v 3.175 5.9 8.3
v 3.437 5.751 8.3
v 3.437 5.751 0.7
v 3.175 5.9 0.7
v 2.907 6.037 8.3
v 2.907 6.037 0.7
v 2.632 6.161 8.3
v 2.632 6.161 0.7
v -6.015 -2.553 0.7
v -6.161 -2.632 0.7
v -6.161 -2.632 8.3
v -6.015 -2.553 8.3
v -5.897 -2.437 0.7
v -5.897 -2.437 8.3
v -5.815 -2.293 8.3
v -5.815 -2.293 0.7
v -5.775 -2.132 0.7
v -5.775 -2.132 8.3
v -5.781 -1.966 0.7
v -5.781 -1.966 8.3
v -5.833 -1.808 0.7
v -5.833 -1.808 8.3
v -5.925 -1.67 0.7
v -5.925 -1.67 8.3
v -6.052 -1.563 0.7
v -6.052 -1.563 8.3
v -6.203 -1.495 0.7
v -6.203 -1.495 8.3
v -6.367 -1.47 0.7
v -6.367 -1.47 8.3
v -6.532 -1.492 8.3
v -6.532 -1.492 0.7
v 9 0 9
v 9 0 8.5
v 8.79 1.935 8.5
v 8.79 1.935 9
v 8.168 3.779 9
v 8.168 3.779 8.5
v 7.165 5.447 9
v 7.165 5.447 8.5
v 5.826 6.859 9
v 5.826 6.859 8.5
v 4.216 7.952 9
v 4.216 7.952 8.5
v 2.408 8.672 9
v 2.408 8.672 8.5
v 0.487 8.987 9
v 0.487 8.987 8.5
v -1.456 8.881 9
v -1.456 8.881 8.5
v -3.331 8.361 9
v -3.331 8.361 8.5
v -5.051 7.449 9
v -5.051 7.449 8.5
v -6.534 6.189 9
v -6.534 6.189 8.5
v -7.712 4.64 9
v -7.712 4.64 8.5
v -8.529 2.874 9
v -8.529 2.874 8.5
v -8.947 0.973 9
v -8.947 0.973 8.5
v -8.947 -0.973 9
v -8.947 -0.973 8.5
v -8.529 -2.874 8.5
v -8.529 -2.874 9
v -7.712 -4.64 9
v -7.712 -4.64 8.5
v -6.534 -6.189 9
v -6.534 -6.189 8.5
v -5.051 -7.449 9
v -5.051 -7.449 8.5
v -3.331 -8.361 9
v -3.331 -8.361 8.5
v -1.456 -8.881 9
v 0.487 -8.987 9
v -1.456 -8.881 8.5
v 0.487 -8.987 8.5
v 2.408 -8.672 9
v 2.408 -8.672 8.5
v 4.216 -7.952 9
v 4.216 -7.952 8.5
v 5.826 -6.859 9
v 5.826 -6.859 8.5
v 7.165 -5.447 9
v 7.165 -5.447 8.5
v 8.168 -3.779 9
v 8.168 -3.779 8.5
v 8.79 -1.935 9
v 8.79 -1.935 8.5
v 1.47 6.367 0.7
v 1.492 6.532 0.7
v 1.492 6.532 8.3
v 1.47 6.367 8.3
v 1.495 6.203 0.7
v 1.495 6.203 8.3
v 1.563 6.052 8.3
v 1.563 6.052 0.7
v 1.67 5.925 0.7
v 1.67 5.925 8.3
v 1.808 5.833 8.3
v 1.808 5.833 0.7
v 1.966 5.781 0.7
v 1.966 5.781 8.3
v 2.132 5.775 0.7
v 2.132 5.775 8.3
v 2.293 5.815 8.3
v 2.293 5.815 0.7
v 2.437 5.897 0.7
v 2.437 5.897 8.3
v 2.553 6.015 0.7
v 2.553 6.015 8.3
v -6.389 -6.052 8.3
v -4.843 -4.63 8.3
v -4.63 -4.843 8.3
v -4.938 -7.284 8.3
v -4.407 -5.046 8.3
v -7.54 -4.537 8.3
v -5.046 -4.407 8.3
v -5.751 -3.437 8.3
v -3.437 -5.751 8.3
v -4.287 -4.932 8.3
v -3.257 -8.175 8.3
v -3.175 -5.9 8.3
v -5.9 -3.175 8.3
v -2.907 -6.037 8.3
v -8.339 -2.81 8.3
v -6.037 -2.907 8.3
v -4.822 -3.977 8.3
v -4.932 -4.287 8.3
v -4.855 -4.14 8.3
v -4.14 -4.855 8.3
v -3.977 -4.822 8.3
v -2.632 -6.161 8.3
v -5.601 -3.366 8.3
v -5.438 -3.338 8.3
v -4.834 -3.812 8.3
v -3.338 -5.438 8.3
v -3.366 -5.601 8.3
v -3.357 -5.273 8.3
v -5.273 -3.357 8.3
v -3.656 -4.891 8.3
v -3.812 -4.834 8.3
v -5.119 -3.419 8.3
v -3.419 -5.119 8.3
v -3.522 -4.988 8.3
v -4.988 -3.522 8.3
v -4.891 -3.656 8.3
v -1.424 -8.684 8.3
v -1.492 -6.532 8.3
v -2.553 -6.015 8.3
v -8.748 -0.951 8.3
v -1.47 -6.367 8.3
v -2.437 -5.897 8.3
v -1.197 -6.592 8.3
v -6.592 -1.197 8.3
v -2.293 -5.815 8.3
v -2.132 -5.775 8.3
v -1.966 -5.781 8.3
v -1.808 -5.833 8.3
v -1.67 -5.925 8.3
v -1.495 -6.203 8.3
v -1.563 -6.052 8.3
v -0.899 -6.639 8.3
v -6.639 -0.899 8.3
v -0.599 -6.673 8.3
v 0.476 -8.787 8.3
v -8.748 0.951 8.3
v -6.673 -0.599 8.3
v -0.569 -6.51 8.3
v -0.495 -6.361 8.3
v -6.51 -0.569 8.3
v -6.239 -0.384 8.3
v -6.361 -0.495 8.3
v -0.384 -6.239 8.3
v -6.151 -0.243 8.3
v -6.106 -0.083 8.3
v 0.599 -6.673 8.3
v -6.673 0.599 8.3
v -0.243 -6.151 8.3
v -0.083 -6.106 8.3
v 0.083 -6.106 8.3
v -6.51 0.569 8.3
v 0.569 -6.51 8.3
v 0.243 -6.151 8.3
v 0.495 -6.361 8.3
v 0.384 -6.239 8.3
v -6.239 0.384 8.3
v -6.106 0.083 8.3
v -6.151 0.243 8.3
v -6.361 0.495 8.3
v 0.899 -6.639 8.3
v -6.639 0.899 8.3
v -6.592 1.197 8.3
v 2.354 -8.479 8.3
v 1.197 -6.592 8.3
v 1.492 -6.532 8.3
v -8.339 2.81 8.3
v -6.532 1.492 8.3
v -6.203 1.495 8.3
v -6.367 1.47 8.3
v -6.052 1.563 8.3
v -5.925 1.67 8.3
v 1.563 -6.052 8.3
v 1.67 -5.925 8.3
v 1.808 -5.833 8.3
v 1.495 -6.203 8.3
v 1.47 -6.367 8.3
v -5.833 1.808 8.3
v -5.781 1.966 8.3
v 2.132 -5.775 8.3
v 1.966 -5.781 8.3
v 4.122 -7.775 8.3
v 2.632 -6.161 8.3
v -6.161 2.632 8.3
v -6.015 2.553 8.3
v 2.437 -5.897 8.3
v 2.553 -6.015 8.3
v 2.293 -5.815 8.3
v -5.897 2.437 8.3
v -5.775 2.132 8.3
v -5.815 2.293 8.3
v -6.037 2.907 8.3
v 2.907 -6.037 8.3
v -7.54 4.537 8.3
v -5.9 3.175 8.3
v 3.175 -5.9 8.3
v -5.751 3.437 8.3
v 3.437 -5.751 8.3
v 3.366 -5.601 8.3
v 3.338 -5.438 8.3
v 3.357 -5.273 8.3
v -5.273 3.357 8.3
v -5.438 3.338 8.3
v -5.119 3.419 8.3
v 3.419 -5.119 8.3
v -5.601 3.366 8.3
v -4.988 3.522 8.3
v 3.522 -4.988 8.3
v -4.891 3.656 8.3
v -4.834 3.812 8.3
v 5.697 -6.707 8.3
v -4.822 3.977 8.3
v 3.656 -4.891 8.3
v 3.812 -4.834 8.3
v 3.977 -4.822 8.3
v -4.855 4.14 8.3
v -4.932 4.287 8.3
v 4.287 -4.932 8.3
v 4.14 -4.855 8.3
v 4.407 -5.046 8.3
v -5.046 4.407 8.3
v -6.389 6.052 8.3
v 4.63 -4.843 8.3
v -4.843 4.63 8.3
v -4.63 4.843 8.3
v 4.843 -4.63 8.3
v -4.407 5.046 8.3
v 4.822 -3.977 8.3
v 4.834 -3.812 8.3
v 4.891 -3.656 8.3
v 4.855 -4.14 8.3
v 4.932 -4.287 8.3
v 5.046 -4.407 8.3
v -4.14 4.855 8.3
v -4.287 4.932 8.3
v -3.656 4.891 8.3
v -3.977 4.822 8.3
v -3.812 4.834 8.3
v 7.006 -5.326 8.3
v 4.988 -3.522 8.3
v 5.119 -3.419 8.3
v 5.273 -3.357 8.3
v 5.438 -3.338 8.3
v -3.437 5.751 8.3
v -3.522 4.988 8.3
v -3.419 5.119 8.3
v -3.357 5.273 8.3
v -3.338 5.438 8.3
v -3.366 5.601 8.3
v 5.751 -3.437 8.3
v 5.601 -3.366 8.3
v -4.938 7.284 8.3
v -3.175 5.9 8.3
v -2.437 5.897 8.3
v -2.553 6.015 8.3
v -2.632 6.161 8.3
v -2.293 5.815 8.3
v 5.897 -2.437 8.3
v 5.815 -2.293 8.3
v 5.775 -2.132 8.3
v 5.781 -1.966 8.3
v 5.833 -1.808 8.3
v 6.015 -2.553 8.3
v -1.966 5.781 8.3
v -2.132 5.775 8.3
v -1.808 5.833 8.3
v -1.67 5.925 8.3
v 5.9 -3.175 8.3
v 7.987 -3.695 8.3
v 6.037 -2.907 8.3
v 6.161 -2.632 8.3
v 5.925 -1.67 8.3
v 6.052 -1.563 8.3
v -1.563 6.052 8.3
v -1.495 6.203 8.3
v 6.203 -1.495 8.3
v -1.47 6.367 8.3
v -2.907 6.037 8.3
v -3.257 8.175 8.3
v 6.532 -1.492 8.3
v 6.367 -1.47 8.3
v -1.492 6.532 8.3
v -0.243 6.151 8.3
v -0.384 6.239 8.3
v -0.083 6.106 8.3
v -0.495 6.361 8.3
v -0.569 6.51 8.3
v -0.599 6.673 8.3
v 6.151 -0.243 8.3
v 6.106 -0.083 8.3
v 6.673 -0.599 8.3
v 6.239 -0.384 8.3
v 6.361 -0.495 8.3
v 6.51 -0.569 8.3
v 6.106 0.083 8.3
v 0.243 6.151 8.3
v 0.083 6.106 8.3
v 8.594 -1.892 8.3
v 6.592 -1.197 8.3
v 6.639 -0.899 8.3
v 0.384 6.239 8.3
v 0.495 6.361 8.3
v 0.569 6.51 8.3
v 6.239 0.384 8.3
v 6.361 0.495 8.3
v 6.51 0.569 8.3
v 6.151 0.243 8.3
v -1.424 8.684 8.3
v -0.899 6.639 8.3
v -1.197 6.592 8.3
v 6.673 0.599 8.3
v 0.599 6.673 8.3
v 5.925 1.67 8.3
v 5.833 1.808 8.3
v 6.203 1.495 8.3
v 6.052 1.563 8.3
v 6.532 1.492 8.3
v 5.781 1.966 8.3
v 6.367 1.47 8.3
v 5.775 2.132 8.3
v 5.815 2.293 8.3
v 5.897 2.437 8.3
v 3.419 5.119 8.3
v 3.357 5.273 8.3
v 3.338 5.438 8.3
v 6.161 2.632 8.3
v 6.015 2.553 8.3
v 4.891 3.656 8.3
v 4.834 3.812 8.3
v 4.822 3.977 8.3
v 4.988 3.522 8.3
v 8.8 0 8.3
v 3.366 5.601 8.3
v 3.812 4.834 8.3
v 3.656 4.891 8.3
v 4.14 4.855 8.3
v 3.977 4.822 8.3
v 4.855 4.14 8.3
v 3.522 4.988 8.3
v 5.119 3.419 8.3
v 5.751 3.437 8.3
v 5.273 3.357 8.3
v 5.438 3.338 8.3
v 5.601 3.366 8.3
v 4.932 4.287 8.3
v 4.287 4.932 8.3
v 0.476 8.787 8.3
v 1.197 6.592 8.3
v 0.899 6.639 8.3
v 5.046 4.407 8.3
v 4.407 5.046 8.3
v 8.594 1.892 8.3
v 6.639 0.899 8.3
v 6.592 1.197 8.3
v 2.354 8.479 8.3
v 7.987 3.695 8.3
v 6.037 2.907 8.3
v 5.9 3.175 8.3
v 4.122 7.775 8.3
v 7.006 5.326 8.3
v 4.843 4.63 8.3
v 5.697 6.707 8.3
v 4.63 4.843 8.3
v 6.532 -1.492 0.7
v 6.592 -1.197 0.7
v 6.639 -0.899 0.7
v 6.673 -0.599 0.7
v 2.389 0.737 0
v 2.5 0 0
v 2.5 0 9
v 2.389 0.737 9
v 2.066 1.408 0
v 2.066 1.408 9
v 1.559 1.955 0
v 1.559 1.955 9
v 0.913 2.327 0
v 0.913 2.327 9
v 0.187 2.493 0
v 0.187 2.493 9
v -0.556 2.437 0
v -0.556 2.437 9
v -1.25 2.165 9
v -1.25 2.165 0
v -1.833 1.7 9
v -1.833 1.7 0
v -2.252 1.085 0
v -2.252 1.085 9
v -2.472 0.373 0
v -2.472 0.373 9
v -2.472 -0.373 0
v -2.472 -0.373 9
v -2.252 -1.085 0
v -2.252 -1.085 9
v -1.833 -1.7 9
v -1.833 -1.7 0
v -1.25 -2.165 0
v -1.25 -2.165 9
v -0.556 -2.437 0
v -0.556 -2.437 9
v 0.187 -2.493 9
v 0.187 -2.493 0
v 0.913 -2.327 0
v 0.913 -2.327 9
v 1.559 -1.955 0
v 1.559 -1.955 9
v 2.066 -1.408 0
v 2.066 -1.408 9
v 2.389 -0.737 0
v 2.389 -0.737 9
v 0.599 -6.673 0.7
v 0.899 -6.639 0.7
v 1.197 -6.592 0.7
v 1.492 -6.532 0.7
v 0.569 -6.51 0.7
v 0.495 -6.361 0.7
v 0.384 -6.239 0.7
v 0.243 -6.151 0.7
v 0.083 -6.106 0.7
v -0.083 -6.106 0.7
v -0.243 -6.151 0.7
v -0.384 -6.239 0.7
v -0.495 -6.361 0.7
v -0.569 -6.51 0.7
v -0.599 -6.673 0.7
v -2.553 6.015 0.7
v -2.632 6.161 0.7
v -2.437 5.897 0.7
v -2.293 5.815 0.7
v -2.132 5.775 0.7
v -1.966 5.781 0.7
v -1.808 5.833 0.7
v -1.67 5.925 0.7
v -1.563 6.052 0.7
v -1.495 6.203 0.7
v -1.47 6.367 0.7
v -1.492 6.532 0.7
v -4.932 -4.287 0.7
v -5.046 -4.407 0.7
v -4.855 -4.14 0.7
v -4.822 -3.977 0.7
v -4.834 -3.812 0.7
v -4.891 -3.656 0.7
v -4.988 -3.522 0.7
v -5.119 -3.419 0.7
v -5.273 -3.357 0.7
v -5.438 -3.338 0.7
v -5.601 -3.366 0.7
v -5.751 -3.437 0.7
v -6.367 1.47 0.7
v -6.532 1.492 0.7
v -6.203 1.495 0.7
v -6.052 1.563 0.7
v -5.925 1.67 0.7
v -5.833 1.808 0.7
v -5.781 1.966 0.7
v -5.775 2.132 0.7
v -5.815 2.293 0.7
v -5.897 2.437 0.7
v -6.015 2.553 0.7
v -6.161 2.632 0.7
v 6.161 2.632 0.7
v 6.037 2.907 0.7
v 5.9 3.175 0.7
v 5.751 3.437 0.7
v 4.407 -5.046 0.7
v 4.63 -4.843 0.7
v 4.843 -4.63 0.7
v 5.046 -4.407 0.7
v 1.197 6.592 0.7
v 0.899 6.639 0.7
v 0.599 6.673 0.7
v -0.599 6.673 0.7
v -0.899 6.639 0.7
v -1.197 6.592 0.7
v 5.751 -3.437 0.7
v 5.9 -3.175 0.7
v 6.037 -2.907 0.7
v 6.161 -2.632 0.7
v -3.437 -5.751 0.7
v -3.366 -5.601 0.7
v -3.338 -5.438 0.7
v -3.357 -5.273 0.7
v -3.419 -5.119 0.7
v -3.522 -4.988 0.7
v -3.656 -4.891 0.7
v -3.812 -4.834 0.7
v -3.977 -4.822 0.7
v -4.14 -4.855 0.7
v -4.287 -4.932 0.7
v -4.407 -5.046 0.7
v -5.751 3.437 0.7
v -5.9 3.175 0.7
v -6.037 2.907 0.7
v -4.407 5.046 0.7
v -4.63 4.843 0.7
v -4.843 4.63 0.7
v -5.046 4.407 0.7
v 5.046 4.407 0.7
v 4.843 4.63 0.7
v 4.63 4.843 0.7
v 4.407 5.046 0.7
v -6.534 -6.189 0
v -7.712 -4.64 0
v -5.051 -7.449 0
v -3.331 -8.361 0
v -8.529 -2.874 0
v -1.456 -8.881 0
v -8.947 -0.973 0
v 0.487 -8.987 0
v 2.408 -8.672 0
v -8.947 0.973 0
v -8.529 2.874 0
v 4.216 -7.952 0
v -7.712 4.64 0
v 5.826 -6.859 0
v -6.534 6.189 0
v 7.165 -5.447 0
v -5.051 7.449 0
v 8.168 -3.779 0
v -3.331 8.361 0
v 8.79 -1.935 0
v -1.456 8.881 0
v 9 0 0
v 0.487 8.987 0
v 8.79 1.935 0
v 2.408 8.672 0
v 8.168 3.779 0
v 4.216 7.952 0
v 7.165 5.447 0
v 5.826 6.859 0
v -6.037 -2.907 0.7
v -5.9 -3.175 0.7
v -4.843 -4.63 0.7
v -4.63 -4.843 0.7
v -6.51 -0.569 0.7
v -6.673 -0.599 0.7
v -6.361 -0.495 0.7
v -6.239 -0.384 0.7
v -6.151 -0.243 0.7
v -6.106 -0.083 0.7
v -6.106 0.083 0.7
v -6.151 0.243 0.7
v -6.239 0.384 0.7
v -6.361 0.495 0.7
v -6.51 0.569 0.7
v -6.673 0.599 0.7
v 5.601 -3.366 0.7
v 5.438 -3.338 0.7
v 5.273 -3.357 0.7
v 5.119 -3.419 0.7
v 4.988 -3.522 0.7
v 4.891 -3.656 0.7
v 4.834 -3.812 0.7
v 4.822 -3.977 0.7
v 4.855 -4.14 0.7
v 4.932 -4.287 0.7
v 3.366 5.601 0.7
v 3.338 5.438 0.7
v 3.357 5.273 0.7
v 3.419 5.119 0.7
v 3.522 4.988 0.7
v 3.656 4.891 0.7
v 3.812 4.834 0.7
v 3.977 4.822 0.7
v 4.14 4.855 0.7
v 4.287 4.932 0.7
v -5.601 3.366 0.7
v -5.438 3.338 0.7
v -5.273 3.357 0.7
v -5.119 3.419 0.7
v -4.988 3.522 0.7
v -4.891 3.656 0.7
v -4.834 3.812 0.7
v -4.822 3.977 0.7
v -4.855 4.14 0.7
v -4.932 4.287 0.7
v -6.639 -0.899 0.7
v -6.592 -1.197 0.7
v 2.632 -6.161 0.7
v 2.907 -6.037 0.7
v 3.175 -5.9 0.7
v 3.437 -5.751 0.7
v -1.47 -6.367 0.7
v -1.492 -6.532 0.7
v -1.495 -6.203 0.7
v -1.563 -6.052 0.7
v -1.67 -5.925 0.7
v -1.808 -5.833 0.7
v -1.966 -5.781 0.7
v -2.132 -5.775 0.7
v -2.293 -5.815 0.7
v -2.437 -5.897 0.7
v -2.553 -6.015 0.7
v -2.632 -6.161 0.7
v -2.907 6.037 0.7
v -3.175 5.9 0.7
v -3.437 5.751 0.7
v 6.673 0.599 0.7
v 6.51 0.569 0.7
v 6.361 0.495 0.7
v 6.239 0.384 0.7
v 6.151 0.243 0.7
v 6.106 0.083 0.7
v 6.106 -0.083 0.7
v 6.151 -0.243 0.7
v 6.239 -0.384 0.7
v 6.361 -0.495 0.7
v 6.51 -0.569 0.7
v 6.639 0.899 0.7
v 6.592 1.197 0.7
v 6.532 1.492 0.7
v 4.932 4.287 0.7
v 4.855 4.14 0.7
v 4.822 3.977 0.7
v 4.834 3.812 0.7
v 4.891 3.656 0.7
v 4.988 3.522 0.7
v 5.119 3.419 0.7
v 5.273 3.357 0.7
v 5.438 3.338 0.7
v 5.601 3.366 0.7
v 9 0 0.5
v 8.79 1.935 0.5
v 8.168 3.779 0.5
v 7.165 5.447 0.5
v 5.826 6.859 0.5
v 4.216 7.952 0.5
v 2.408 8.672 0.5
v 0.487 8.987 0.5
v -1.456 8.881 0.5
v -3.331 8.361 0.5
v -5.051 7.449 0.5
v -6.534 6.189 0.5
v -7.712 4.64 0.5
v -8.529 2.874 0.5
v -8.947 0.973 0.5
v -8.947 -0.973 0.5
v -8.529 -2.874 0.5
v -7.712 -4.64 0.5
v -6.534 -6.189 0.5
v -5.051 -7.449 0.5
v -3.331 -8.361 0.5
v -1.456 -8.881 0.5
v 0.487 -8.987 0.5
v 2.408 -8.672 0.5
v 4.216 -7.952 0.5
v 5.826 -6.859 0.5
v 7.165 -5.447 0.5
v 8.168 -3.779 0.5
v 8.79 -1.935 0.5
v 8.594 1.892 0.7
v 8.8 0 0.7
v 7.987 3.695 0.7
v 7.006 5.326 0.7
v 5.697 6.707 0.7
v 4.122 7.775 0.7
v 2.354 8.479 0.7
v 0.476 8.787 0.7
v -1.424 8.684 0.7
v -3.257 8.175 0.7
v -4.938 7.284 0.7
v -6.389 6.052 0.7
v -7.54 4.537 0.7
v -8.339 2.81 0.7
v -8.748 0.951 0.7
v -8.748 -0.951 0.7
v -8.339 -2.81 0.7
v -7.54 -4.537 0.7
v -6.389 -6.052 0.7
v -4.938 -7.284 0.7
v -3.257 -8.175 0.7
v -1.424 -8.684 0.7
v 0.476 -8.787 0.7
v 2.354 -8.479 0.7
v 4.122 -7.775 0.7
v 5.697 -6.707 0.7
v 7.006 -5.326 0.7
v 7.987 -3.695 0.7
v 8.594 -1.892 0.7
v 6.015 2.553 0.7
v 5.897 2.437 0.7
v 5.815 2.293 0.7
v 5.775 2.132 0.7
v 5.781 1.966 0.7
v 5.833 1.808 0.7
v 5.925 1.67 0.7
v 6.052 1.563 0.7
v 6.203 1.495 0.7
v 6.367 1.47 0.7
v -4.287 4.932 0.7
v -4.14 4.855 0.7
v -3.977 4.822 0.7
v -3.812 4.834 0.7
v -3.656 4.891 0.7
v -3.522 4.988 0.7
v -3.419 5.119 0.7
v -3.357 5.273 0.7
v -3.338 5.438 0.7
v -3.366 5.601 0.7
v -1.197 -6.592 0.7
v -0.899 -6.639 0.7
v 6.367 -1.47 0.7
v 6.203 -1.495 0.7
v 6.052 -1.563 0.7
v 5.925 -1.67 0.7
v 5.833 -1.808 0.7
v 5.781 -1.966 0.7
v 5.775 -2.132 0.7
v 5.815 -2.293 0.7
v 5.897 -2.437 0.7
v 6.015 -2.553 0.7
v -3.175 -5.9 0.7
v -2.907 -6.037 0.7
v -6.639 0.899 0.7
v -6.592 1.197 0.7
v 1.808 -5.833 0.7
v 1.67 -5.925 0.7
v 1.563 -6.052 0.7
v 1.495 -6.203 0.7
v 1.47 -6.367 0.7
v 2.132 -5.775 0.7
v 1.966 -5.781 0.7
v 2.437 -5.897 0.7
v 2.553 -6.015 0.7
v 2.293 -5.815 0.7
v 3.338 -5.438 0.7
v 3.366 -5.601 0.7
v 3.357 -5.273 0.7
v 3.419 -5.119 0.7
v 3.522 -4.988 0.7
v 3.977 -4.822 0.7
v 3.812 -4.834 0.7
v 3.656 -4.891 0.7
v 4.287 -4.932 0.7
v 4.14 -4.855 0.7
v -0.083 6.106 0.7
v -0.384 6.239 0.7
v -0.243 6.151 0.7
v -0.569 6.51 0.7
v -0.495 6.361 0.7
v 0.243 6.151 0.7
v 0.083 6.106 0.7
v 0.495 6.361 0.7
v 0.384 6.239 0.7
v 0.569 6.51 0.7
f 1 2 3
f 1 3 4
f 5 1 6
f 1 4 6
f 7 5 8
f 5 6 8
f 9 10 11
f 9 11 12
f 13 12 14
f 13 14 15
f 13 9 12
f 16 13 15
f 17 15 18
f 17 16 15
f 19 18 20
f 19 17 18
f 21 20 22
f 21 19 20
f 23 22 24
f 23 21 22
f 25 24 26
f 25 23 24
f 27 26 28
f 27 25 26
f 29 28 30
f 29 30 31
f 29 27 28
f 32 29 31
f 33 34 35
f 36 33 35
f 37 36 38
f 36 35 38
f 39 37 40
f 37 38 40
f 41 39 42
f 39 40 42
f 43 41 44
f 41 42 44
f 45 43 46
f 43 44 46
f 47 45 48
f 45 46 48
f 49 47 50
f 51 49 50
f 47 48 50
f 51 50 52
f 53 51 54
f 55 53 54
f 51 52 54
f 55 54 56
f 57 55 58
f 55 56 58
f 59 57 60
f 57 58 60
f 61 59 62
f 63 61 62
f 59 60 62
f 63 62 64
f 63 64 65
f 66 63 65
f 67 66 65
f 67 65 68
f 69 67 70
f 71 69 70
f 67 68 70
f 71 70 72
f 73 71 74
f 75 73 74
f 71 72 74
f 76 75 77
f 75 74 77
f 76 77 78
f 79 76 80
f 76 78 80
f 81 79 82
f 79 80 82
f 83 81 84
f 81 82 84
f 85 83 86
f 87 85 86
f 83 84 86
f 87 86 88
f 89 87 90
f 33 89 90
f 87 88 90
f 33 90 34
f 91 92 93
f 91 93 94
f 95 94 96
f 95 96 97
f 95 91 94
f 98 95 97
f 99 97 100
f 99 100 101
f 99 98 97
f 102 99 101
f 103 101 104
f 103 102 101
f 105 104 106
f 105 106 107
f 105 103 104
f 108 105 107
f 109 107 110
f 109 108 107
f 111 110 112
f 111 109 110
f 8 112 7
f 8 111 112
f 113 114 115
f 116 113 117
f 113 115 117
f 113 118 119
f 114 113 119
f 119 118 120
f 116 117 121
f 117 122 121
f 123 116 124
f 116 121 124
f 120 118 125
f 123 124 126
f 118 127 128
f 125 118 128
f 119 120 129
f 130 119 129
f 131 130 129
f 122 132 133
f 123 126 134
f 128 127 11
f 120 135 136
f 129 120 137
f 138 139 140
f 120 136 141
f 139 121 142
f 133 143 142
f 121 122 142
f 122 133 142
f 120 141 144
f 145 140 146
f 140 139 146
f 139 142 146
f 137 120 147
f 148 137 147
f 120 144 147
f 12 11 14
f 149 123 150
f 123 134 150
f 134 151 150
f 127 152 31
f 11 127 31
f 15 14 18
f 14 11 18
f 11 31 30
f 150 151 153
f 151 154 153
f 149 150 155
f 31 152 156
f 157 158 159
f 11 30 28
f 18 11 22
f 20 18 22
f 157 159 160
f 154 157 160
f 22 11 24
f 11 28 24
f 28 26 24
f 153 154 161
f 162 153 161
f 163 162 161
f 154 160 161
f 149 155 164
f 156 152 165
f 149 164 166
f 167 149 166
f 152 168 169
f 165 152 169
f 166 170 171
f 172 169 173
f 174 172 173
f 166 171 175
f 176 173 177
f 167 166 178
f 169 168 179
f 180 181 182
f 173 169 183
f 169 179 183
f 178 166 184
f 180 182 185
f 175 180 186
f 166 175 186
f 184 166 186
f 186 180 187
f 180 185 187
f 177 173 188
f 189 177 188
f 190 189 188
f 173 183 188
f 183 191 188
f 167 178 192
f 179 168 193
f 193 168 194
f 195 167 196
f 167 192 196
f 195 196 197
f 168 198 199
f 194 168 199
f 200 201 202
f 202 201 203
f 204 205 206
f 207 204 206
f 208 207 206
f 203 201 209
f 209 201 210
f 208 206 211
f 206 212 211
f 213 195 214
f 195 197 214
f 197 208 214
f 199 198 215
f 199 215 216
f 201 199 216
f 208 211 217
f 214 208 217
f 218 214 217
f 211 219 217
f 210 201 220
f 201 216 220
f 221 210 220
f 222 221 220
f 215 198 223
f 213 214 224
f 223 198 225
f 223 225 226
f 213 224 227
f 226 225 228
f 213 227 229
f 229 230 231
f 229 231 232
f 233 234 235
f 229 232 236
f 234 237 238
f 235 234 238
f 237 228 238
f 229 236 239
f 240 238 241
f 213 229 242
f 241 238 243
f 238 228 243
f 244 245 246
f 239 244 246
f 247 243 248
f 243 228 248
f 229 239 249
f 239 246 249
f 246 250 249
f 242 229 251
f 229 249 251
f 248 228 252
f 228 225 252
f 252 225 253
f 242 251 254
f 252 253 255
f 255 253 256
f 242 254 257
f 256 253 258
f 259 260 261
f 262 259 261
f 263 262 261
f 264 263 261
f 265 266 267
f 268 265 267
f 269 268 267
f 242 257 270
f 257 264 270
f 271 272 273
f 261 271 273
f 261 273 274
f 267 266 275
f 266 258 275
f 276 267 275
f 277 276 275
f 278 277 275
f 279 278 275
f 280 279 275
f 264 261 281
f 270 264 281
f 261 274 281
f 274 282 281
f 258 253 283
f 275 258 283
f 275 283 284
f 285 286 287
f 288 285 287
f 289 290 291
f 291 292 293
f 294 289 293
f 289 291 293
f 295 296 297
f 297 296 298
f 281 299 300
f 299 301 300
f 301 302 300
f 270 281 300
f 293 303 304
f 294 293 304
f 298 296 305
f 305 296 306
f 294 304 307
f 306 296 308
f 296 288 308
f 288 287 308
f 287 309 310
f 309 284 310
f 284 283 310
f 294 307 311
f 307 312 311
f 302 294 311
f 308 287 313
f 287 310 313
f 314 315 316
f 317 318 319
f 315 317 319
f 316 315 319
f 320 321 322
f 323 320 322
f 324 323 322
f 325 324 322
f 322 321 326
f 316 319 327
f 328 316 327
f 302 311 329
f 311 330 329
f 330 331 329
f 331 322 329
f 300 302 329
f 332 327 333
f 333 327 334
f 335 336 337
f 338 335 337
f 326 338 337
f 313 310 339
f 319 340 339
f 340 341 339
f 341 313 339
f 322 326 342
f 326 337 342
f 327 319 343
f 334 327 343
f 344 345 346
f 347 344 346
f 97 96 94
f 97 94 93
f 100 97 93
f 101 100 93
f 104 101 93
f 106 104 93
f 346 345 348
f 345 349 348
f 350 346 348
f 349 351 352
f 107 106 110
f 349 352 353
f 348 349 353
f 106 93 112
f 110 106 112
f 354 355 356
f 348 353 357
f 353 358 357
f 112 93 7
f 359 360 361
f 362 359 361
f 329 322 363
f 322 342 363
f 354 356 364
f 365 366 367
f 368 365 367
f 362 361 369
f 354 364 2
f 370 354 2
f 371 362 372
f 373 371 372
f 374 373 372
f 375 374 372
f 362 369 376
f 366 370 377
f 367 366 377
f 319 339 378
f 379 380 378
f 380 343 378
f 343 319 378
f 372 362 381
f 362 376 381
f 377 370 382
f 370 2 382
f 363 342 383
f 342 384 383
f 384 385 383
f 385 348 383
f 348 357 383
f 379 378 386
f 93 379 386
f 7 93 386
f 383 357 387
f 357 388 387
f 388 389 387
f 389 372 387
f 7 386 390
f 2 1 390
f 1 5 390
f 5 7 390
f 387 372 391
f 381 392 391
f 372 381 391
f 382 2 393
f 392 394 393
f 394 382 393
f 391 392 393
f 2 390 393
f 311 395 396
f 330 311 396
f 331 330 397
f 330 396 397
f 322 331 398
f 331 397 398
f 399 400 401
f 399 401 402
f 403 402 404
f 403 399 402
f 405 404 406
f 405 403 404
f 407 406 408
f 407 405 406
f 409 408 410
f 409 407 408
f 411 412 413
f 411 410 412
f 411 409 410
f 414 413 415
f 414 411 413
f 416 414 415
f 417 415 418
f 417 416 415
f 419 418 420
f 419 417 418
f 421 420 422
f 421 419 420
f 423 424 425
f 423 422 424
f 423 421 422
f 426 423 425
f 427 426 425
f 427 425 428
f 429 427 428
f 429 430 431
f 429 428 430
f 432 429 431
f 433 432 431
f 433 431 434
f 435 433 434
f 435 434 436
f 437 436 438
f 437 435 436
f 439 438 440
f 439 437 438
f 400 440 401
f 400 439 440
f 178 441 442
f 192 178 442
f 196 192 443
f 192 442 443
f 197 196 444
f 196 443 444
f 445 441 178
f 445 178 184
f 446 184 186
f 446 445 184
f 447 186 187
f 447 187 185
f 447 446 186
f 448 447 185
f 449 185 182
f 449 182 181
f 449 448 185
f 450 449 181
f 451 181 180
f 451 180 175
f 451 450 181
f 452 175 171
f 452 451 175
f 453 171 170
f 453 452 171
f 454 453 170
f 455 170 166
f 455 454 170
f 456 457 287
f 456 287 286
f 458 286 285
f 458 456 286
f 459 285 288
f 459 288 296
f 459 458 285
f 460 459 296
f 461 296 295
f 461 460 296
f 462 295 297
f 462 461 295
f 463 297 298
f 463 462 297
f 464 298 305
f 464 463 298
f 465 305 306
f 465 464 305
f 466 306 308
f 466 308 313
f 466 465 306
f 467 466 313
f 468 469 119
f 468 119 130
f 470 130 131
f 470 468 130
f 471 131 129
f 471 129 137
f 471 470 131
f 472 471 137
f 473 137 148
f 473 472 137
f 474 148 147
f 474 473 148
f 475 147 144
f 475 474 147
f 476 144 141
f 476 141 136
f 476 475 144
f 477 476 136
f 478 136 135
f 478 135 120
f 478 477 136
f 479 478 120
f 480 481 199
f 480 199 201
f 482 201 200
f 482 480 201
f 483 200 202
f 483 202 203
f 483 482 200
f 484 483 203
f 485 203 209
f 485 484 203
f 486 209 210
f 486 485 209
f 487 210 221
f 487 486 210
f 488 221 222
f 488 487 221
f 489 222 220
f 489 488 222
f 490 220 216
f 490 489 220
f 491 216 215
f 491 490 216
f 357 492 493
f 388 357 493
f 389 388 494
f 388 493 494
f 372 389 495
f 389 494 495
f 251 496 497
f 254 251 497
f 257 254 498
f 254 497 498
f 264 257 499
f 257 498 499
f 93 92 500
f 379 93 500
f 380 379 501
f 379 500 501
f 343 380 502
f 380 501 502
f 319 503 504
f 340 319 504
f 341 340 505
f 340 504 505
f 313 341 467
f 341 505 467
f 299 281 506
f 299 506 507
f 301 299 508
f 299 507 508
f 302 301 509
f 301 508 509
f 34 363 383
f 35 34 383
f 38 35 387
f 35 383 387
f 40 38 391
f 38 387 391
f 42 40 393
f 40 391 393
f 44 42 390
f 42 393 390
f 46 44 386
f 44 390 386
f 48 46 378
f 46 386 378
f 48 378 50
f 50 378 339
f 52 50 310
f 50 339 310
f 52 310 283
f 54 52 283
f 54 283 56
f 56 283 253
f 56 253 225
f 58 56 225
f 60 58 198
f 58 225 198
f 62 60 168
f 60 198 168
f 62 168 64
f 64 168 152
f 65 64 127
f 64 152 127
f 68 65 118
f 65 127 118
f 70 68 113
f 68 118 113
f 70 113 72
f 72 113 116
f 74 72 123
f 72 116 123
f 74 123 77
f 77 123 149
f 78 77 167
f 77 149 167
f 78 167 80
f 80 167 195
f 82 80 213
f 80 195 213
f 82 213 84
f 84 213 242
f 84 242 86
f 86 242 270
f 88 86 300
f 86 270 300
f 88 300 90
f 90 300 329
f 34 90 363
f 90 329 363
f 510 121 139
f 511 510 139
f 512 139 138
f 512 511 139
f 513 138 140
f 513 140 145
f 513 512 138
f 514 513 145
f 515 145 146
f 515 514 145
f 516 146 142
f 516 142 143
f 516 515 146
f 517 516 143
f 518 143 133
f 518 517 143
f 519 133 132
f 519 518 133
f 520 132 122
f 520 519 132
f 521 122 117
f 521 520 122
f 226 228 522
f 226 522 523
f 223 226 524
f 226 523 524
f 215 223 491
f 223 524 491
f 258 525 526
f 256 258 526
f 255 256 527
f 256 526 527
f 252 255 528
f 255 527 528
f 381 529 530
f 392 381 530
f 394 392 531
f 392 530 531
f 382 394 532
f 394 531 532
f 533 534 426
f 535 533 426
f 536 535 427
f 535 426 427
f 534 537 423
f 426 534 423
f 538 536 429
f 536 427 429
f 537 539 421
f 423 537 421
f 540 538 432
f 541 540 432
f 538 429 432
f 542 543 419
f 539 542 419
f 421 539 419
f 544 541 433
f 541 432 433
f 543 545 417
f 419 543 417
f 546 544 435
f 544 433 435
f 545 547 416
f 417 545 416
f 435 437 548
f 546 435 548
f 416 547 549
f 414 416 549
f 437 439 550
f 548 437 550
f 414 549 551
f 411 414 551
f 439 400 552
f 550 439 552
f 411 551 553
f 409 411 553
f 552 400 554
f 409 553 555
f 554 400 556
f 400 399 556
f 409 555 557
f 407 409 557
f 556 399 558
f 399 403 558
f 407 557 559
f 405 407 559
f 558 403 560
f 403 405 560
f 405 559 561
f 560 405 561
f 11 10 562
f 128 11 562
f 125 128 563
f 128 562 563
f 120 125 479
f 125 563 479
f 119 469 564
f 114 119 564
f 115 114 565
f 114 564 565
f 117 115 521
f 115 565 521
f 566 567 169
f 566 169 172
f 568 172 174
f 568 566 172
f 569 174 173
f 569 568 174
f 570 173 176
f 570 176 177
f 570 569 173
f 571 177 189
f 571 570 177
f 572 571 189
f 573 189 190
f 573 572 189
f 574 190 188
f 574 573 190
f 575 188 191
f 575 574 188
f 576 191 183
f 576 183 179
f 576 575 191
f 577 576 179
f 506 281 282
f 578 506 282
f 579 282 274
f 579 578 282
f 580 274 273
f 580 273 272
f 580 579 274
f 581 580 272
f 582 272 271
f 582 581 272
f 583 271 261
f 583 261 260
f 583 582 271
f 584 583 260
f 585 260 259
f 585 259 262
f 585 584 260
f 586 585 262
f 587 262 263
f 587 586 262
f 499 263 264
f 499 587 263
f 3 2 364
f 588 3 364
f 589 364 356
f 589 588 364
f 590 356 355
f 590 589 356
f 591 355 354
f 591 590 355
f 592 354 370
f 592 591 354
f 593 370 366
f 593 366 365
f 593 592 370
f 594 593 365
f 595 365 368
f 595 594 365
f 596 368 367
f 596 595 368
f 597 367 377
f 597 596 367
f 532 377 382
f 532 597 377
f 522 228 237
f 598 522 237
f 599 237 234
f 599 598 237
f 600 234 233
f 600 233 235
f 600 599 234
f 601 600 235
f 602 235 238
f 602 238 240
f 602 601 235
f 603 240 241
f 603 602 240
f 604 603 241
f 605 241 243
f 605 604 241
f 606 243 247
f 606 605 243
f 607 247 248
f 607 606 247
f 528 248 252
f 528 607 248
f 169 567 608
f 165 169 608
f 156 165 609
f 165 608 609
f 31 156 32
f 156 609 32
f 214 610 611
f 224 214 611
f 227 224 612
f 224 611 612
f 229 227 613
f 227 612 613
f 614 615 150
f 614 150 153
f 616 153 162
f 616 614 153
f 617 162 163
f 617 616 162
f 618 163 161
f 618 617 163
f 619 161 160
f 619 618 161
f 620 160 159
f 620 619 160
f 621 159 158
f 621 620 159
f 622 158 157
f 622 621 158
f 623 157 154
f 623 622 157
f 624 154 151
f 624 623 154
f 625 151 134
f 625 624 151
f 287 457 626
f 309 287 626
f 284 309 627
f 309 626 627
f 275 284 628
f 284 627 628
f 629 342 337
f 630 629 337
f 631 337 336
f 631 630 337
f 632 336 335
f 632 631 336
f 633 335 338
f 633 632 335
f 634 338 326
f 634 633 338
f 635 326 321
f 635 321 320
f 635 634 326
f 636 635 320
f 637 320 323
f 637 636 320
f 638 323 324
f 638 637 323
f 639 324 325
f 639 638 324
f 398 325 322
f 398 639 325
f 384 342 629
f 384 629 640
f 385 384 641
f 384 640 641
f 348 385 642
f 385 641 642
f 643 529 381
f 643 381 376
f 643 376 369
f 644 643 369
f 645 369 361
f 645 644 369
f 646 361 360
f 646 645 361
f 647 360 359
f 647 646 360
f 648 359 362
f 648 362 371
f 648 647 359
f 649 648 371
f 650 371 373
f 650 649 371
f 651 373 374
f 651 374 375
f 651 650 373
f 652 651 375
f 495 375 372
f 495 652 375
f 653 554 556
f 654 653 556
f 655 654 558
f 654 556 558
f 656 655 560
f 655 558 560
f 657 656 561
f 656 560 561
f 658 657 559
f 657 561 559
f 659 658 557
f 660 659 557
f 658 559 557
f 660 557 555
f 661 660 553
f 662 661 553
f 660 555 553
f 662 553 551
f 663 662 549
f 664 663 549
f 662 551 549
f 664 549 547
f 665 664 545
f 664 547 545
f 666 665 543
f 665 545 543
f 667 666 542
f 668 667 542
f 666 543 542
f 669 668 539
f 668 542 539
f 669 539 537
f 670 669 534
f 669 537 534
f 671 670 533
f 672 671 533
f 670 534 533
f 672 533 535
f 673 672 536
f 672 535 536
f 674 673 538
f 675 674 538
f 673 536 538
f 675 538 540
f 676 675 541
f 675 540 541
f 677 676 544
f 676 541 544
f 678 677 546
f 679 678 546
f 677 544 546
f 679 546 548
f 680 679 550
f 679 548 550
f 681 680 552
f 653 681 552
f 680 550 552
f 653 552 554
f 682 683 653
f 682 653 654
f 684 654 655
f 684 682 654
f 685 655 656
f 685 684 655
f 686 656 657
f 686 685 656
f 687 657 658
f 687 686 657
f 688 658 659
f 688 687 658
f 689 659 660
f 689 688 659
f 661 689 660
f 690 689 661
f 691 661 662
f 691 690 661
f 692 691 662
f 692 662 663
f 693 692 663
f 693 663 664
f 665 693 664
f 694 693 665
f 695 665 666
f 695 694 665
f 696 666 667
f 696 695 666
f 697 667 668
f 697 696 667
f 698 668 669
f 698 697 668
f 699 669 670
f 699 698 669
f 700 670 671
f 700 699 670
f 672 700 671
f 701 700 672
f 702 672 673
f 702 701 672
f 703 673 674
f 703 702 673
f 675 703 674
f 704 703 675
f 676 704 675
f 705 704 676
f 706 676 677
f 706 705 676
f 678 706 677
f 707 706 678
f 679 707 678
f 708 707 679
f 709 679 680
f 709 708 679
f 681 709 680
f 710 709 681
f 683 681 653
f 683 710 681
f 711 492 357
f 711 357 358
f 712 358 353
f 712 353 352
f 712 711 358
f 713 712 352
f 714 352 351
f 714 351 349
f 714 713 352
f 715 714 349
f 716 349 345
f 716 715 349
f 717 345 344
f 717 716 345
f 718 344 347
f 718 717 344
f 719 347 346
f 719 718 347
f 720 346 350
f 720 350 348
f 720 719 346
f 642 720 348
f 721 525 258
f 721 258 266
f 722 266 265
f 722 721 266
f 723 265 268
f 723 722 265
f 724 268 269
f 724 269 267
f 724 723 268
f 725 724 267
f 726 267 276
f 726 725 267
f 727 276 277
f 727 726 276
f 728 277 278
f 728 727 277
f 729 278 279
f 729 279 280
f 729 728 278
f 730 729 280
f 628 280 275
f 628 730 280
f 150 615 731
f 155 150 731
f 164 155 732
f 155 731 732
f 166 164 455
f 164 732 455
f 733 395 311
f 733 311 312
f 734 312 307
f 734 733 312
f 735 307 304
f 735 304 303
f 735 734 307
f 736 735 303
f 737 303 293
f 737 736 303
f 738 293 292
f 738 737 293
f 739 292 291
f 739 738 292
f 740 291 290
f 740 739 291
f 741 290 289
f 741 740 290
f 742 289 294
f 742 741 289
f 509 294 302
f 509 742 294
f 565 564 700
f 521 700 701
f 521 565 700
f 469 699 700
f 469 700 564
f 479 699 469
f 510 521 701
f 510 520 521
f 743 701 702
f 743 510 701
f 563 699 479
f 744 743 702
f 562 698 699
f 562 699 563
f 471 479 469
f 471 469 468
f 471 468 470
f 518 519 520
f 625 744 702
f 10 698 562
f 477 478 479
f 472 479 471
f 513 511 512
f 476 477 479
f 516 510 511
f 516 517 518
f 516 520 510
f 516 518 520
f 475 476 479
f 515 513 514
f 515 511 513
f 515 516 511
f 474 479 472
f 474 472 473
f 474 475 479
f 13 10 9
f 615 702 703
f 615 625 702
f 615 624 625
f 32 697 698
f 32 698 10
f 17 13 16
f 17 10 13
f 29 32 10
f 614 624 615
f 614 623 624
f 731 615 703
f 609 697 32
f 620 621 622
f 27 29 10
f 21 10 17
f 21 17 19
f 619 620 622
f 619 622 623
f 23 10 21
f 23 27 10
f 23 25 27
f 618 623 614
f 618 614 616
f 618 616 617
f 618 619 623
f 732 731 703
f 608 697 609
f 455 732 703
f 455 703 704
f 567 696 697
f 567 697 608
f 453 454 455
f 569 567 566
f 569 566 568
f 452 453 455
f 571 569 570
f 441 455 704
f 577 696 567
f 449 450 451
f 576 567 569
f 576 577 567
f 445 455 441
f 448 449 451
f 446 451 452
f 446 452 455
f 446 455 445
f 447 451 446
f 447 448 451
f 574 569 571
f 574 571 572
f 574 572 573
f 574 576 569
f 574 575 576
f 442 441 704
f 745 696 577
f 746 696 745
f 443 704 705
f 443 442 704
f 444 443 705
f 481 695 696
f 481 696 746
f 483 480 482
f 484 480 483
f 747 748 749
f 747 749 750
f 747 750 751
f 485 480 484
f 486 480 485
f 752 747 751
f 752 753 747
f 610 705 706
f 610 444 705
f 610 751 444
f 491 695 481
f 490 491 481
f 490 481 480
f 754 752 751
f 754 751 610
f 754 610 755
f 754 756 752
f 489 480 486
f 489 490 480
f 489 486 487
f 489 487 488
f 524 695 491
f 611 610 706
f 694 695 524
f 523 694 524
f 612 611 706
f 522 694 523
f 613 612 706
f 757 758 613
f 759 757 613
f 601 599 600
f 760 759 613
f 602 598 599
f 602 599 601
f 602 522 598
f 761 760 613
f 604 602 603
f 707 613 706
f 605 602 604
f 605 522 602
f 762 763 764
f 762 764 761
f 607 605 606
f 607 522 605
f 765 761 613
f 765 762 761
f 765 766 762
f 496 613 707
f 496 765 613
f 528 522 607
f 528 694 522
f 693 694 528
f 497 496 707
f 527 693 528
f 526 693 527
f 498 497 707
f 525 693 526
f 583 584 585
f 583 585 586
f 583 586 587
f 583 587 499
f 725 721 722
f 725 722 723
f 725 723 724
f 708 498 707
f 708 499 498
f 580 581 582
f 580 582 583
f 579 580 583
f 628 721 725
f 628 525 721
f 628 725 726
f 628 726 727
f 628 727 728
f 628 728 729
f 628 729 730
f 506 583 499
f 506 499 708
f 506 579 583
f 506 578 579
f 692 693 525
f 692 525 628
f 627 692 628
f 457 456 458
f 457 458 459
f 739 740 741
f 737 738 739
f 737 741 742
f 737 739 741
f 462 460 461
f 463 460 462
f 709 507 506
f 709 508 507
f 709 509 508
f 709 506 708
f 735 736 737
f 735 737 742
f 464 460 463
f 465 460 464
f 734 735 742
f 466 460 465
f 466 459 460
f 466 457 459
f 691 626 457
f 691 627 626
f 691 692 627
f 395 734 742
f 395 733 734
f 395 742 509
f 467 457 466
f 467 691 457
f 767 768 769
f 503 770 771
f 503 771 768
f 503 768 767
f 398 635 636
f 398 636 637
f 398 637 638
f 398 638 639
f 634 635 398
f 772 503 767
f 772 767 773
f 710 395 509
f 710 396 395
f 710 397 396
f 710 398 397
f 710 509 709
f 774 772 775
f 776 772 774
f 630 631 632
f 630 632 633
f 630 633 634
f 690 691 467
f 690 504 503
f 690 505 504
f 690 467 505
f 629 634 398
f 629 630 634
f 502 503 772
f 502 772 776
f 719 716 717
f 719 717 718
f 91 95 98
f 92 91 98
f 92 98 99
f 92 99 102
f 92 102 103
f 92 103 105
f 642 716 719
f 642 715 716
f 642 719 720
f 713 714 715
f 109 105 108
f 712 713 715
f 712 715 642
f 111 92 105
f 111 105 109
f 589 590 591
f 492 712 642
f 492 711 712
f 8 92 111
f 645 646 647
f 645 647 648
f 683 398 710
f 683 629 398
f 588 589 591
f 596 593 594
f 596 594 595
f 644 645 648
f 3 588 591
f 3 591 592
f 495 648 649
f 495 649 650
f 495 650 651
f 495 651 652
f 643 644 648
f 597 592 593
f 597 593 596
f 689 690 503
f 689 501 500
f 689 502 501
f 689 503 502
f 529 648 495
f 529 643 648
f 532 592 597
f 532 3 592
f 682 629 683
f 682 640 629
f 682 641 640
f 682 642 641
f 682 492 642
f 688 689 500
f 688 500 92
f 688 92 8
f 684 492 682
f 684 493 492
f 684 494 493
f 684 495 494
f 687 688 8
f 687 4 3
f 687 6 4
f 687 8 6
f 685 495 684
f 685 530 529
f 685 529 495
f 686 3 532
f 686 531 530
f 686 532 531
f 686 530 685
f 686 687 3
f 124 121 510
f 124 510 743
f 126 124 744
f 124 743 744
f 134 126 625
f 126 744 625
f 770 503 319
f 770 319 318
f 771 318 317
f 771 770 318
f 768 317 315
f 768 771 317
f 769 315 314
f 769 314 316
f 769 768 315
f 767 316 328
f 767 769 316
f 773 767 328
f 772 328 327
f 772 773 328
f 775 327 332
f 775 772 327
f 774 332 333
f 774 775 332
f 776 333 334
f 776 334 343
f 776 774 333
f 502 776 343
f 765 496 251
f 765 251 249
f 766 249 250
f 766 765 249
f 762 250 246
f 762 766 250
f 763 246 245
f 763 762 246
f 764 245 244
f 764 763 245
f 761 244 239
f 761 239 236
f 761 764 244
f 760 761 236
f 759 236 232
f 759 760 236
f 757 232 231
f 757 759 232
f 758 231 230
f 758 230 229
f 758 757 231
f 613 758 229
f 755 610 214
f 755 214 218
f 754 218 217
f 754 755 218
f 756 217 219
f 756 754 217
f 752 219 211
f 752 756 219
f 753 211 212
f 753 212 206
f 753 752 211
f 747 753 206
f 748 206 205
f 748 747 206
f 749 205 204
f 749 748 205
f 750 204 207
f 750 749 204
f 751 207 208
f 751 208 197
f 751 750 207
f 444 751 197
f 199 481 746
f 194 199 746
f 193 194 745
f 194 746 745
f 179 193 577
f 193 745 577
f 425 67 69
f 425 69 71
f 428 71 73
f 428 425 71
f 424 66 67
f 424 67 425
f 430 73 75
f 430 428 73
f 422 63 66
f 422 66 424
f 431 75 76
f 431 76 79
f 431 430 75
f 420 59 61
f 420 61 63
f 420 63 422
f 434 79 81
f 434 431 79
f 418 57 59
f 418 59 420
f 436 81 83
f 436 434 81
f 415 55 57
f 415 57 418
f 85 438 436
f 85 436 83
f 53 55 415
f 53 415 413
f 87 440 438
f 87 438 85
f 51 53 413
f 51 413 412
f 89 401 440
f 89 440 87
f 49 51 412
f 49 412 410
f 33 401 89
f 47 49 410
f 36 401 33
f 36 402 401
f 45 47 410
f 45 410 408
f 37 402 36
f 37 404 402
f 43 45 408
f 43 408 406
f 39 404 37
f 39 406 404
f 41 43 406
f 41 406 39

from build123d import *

# Parameters (mm, degrees)
CYLINDER017_R     = 2.5
CYLINDER017_DEPTH = 28.6
CYLINDER015_R     = 9
CYLINDER015_DEPTH = 0.7
CHAMFER015_SIZE   = 0.2
CYLINDER016_R     = 9
CYLINDER016_DEPTH = 0.7
CHAMFER016_SIZE   = 0.2
CYLINDER013_R     = 0.6
CYLINDER013_DEPTH = 7.6
ARRAY002_COUNT    = 20
CYLINDER014_R     = 6.7
CYLINDER014_DEPTH = 7.6


with BuildPart() as cilindro007:
    # Cylinder017 → Cylinder017 (new body)
    with BuildSketch(Plane.XY.offset(-6)):
        Circle(CYLINDER017_R)
    extrude(amount=CYLINDER017_DEPTH)


with BuildPart() as chamfer015:
    # Cylinder015 → Cylinder015 (new body)
    with BuildSketch(Plane.XY):
        Circle(CYLINDER015_R)
    extrude(amount=CYLINDER015_DEPTH)

    # Chamfer015
    chamfer015_edges = [chamfer015.edges().sort_by_distance(p)[0] for p in [
        (-9, 0, 0.7),
    ]]
    chamfer(chamfer015_edges, length=CHAMFER015_SIZE)


with BuildPart() as chamfer016:
    # Cylinder016 → Cylinder016 (new body)
    with BuildSketch(Plane.XY.offset(8.3)):
        Circle(CYLINDER016_R)
    extrude(amount=CYLINDER016_DEPTH)

    # Chamfer016
    chamfer016_edges = [chamfer016.edges().sort_by_distance(p)[0] for p in [
        (-9, 0, 8.3),
    ]]
    chamfer(chamfer016_edges, length=CHAMFER016_SIZE)


with BuildPart() as array002:
    # Cylinder013 → Cylinder013 (new body)
    with BuildSketch(Plane(origin=(6.7, 0, 0), x_dir=(1, 0, 0), z_dir=(0, 0, 1))):
        Circle(CYLINDER013_R)
    extrude(amount=CYLINDER013_DEPTH)

    # Array002: Array002 ×20 about axis
    array002_axis = Axis((0, 0, 0), (0, 0, 1))


with BuildPart() as array002_1:
    add(array002.part)
    for i in range(1, ARRAY002_COUNT):
        add(array002.part.rotate(array002_axis, i * 360 / ARRAY002_COUNT))


with BuildPart() as cut007:
    # Cylinder014 → Cylinder014 (new body)
    with BuildSketch(Plane.XY):
        Circle(CYLINDER014_R)
    extrude(amount=CYLINDER014_DEPTH)

    # Cut006: cut Array002
    add(array002_1.part, mode=Mode.SUBTRACT)


with BuildPart() as cut007_1:
    # Cut006 placement: moved
    add(cut007.part.moved(Location((0, 0, 0.7))))

    # Fusion007002: union Chamfer015, Chamfer016
    add(chamfer015.part)
    add(chamfer016.part)

    # Cut007: cut Cilindro007
    add(cilindro007.part, mode=Mode.SUBTRACT)


solid = cut007_1.part
